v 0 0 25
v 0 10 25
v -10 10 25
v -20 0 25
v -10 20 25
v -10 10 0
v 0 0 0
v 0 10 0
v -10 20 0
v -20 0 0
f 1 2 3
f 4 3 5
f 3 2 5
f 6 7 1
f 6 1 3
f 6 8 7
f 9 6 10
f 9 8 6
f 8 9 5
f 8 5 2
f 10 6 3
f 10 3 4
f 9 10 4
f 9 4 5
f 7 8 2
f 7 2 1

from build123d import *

# Parameters (mm, degrees)
BOSS_EXTRUDE1_DEPTH = 25


with BuildPart() as part:
    # Sketch1 → Boss-Extrude1 (new body)
    with BuildSketch(Plane.XY):
        Polygon((-20, 0), (-10, 20), (0, 10), (0, 0), (-10, 10), align=None)
    extrude(amount=BOSS_EXTRUDE1_DEPTH)


solid = part.part
